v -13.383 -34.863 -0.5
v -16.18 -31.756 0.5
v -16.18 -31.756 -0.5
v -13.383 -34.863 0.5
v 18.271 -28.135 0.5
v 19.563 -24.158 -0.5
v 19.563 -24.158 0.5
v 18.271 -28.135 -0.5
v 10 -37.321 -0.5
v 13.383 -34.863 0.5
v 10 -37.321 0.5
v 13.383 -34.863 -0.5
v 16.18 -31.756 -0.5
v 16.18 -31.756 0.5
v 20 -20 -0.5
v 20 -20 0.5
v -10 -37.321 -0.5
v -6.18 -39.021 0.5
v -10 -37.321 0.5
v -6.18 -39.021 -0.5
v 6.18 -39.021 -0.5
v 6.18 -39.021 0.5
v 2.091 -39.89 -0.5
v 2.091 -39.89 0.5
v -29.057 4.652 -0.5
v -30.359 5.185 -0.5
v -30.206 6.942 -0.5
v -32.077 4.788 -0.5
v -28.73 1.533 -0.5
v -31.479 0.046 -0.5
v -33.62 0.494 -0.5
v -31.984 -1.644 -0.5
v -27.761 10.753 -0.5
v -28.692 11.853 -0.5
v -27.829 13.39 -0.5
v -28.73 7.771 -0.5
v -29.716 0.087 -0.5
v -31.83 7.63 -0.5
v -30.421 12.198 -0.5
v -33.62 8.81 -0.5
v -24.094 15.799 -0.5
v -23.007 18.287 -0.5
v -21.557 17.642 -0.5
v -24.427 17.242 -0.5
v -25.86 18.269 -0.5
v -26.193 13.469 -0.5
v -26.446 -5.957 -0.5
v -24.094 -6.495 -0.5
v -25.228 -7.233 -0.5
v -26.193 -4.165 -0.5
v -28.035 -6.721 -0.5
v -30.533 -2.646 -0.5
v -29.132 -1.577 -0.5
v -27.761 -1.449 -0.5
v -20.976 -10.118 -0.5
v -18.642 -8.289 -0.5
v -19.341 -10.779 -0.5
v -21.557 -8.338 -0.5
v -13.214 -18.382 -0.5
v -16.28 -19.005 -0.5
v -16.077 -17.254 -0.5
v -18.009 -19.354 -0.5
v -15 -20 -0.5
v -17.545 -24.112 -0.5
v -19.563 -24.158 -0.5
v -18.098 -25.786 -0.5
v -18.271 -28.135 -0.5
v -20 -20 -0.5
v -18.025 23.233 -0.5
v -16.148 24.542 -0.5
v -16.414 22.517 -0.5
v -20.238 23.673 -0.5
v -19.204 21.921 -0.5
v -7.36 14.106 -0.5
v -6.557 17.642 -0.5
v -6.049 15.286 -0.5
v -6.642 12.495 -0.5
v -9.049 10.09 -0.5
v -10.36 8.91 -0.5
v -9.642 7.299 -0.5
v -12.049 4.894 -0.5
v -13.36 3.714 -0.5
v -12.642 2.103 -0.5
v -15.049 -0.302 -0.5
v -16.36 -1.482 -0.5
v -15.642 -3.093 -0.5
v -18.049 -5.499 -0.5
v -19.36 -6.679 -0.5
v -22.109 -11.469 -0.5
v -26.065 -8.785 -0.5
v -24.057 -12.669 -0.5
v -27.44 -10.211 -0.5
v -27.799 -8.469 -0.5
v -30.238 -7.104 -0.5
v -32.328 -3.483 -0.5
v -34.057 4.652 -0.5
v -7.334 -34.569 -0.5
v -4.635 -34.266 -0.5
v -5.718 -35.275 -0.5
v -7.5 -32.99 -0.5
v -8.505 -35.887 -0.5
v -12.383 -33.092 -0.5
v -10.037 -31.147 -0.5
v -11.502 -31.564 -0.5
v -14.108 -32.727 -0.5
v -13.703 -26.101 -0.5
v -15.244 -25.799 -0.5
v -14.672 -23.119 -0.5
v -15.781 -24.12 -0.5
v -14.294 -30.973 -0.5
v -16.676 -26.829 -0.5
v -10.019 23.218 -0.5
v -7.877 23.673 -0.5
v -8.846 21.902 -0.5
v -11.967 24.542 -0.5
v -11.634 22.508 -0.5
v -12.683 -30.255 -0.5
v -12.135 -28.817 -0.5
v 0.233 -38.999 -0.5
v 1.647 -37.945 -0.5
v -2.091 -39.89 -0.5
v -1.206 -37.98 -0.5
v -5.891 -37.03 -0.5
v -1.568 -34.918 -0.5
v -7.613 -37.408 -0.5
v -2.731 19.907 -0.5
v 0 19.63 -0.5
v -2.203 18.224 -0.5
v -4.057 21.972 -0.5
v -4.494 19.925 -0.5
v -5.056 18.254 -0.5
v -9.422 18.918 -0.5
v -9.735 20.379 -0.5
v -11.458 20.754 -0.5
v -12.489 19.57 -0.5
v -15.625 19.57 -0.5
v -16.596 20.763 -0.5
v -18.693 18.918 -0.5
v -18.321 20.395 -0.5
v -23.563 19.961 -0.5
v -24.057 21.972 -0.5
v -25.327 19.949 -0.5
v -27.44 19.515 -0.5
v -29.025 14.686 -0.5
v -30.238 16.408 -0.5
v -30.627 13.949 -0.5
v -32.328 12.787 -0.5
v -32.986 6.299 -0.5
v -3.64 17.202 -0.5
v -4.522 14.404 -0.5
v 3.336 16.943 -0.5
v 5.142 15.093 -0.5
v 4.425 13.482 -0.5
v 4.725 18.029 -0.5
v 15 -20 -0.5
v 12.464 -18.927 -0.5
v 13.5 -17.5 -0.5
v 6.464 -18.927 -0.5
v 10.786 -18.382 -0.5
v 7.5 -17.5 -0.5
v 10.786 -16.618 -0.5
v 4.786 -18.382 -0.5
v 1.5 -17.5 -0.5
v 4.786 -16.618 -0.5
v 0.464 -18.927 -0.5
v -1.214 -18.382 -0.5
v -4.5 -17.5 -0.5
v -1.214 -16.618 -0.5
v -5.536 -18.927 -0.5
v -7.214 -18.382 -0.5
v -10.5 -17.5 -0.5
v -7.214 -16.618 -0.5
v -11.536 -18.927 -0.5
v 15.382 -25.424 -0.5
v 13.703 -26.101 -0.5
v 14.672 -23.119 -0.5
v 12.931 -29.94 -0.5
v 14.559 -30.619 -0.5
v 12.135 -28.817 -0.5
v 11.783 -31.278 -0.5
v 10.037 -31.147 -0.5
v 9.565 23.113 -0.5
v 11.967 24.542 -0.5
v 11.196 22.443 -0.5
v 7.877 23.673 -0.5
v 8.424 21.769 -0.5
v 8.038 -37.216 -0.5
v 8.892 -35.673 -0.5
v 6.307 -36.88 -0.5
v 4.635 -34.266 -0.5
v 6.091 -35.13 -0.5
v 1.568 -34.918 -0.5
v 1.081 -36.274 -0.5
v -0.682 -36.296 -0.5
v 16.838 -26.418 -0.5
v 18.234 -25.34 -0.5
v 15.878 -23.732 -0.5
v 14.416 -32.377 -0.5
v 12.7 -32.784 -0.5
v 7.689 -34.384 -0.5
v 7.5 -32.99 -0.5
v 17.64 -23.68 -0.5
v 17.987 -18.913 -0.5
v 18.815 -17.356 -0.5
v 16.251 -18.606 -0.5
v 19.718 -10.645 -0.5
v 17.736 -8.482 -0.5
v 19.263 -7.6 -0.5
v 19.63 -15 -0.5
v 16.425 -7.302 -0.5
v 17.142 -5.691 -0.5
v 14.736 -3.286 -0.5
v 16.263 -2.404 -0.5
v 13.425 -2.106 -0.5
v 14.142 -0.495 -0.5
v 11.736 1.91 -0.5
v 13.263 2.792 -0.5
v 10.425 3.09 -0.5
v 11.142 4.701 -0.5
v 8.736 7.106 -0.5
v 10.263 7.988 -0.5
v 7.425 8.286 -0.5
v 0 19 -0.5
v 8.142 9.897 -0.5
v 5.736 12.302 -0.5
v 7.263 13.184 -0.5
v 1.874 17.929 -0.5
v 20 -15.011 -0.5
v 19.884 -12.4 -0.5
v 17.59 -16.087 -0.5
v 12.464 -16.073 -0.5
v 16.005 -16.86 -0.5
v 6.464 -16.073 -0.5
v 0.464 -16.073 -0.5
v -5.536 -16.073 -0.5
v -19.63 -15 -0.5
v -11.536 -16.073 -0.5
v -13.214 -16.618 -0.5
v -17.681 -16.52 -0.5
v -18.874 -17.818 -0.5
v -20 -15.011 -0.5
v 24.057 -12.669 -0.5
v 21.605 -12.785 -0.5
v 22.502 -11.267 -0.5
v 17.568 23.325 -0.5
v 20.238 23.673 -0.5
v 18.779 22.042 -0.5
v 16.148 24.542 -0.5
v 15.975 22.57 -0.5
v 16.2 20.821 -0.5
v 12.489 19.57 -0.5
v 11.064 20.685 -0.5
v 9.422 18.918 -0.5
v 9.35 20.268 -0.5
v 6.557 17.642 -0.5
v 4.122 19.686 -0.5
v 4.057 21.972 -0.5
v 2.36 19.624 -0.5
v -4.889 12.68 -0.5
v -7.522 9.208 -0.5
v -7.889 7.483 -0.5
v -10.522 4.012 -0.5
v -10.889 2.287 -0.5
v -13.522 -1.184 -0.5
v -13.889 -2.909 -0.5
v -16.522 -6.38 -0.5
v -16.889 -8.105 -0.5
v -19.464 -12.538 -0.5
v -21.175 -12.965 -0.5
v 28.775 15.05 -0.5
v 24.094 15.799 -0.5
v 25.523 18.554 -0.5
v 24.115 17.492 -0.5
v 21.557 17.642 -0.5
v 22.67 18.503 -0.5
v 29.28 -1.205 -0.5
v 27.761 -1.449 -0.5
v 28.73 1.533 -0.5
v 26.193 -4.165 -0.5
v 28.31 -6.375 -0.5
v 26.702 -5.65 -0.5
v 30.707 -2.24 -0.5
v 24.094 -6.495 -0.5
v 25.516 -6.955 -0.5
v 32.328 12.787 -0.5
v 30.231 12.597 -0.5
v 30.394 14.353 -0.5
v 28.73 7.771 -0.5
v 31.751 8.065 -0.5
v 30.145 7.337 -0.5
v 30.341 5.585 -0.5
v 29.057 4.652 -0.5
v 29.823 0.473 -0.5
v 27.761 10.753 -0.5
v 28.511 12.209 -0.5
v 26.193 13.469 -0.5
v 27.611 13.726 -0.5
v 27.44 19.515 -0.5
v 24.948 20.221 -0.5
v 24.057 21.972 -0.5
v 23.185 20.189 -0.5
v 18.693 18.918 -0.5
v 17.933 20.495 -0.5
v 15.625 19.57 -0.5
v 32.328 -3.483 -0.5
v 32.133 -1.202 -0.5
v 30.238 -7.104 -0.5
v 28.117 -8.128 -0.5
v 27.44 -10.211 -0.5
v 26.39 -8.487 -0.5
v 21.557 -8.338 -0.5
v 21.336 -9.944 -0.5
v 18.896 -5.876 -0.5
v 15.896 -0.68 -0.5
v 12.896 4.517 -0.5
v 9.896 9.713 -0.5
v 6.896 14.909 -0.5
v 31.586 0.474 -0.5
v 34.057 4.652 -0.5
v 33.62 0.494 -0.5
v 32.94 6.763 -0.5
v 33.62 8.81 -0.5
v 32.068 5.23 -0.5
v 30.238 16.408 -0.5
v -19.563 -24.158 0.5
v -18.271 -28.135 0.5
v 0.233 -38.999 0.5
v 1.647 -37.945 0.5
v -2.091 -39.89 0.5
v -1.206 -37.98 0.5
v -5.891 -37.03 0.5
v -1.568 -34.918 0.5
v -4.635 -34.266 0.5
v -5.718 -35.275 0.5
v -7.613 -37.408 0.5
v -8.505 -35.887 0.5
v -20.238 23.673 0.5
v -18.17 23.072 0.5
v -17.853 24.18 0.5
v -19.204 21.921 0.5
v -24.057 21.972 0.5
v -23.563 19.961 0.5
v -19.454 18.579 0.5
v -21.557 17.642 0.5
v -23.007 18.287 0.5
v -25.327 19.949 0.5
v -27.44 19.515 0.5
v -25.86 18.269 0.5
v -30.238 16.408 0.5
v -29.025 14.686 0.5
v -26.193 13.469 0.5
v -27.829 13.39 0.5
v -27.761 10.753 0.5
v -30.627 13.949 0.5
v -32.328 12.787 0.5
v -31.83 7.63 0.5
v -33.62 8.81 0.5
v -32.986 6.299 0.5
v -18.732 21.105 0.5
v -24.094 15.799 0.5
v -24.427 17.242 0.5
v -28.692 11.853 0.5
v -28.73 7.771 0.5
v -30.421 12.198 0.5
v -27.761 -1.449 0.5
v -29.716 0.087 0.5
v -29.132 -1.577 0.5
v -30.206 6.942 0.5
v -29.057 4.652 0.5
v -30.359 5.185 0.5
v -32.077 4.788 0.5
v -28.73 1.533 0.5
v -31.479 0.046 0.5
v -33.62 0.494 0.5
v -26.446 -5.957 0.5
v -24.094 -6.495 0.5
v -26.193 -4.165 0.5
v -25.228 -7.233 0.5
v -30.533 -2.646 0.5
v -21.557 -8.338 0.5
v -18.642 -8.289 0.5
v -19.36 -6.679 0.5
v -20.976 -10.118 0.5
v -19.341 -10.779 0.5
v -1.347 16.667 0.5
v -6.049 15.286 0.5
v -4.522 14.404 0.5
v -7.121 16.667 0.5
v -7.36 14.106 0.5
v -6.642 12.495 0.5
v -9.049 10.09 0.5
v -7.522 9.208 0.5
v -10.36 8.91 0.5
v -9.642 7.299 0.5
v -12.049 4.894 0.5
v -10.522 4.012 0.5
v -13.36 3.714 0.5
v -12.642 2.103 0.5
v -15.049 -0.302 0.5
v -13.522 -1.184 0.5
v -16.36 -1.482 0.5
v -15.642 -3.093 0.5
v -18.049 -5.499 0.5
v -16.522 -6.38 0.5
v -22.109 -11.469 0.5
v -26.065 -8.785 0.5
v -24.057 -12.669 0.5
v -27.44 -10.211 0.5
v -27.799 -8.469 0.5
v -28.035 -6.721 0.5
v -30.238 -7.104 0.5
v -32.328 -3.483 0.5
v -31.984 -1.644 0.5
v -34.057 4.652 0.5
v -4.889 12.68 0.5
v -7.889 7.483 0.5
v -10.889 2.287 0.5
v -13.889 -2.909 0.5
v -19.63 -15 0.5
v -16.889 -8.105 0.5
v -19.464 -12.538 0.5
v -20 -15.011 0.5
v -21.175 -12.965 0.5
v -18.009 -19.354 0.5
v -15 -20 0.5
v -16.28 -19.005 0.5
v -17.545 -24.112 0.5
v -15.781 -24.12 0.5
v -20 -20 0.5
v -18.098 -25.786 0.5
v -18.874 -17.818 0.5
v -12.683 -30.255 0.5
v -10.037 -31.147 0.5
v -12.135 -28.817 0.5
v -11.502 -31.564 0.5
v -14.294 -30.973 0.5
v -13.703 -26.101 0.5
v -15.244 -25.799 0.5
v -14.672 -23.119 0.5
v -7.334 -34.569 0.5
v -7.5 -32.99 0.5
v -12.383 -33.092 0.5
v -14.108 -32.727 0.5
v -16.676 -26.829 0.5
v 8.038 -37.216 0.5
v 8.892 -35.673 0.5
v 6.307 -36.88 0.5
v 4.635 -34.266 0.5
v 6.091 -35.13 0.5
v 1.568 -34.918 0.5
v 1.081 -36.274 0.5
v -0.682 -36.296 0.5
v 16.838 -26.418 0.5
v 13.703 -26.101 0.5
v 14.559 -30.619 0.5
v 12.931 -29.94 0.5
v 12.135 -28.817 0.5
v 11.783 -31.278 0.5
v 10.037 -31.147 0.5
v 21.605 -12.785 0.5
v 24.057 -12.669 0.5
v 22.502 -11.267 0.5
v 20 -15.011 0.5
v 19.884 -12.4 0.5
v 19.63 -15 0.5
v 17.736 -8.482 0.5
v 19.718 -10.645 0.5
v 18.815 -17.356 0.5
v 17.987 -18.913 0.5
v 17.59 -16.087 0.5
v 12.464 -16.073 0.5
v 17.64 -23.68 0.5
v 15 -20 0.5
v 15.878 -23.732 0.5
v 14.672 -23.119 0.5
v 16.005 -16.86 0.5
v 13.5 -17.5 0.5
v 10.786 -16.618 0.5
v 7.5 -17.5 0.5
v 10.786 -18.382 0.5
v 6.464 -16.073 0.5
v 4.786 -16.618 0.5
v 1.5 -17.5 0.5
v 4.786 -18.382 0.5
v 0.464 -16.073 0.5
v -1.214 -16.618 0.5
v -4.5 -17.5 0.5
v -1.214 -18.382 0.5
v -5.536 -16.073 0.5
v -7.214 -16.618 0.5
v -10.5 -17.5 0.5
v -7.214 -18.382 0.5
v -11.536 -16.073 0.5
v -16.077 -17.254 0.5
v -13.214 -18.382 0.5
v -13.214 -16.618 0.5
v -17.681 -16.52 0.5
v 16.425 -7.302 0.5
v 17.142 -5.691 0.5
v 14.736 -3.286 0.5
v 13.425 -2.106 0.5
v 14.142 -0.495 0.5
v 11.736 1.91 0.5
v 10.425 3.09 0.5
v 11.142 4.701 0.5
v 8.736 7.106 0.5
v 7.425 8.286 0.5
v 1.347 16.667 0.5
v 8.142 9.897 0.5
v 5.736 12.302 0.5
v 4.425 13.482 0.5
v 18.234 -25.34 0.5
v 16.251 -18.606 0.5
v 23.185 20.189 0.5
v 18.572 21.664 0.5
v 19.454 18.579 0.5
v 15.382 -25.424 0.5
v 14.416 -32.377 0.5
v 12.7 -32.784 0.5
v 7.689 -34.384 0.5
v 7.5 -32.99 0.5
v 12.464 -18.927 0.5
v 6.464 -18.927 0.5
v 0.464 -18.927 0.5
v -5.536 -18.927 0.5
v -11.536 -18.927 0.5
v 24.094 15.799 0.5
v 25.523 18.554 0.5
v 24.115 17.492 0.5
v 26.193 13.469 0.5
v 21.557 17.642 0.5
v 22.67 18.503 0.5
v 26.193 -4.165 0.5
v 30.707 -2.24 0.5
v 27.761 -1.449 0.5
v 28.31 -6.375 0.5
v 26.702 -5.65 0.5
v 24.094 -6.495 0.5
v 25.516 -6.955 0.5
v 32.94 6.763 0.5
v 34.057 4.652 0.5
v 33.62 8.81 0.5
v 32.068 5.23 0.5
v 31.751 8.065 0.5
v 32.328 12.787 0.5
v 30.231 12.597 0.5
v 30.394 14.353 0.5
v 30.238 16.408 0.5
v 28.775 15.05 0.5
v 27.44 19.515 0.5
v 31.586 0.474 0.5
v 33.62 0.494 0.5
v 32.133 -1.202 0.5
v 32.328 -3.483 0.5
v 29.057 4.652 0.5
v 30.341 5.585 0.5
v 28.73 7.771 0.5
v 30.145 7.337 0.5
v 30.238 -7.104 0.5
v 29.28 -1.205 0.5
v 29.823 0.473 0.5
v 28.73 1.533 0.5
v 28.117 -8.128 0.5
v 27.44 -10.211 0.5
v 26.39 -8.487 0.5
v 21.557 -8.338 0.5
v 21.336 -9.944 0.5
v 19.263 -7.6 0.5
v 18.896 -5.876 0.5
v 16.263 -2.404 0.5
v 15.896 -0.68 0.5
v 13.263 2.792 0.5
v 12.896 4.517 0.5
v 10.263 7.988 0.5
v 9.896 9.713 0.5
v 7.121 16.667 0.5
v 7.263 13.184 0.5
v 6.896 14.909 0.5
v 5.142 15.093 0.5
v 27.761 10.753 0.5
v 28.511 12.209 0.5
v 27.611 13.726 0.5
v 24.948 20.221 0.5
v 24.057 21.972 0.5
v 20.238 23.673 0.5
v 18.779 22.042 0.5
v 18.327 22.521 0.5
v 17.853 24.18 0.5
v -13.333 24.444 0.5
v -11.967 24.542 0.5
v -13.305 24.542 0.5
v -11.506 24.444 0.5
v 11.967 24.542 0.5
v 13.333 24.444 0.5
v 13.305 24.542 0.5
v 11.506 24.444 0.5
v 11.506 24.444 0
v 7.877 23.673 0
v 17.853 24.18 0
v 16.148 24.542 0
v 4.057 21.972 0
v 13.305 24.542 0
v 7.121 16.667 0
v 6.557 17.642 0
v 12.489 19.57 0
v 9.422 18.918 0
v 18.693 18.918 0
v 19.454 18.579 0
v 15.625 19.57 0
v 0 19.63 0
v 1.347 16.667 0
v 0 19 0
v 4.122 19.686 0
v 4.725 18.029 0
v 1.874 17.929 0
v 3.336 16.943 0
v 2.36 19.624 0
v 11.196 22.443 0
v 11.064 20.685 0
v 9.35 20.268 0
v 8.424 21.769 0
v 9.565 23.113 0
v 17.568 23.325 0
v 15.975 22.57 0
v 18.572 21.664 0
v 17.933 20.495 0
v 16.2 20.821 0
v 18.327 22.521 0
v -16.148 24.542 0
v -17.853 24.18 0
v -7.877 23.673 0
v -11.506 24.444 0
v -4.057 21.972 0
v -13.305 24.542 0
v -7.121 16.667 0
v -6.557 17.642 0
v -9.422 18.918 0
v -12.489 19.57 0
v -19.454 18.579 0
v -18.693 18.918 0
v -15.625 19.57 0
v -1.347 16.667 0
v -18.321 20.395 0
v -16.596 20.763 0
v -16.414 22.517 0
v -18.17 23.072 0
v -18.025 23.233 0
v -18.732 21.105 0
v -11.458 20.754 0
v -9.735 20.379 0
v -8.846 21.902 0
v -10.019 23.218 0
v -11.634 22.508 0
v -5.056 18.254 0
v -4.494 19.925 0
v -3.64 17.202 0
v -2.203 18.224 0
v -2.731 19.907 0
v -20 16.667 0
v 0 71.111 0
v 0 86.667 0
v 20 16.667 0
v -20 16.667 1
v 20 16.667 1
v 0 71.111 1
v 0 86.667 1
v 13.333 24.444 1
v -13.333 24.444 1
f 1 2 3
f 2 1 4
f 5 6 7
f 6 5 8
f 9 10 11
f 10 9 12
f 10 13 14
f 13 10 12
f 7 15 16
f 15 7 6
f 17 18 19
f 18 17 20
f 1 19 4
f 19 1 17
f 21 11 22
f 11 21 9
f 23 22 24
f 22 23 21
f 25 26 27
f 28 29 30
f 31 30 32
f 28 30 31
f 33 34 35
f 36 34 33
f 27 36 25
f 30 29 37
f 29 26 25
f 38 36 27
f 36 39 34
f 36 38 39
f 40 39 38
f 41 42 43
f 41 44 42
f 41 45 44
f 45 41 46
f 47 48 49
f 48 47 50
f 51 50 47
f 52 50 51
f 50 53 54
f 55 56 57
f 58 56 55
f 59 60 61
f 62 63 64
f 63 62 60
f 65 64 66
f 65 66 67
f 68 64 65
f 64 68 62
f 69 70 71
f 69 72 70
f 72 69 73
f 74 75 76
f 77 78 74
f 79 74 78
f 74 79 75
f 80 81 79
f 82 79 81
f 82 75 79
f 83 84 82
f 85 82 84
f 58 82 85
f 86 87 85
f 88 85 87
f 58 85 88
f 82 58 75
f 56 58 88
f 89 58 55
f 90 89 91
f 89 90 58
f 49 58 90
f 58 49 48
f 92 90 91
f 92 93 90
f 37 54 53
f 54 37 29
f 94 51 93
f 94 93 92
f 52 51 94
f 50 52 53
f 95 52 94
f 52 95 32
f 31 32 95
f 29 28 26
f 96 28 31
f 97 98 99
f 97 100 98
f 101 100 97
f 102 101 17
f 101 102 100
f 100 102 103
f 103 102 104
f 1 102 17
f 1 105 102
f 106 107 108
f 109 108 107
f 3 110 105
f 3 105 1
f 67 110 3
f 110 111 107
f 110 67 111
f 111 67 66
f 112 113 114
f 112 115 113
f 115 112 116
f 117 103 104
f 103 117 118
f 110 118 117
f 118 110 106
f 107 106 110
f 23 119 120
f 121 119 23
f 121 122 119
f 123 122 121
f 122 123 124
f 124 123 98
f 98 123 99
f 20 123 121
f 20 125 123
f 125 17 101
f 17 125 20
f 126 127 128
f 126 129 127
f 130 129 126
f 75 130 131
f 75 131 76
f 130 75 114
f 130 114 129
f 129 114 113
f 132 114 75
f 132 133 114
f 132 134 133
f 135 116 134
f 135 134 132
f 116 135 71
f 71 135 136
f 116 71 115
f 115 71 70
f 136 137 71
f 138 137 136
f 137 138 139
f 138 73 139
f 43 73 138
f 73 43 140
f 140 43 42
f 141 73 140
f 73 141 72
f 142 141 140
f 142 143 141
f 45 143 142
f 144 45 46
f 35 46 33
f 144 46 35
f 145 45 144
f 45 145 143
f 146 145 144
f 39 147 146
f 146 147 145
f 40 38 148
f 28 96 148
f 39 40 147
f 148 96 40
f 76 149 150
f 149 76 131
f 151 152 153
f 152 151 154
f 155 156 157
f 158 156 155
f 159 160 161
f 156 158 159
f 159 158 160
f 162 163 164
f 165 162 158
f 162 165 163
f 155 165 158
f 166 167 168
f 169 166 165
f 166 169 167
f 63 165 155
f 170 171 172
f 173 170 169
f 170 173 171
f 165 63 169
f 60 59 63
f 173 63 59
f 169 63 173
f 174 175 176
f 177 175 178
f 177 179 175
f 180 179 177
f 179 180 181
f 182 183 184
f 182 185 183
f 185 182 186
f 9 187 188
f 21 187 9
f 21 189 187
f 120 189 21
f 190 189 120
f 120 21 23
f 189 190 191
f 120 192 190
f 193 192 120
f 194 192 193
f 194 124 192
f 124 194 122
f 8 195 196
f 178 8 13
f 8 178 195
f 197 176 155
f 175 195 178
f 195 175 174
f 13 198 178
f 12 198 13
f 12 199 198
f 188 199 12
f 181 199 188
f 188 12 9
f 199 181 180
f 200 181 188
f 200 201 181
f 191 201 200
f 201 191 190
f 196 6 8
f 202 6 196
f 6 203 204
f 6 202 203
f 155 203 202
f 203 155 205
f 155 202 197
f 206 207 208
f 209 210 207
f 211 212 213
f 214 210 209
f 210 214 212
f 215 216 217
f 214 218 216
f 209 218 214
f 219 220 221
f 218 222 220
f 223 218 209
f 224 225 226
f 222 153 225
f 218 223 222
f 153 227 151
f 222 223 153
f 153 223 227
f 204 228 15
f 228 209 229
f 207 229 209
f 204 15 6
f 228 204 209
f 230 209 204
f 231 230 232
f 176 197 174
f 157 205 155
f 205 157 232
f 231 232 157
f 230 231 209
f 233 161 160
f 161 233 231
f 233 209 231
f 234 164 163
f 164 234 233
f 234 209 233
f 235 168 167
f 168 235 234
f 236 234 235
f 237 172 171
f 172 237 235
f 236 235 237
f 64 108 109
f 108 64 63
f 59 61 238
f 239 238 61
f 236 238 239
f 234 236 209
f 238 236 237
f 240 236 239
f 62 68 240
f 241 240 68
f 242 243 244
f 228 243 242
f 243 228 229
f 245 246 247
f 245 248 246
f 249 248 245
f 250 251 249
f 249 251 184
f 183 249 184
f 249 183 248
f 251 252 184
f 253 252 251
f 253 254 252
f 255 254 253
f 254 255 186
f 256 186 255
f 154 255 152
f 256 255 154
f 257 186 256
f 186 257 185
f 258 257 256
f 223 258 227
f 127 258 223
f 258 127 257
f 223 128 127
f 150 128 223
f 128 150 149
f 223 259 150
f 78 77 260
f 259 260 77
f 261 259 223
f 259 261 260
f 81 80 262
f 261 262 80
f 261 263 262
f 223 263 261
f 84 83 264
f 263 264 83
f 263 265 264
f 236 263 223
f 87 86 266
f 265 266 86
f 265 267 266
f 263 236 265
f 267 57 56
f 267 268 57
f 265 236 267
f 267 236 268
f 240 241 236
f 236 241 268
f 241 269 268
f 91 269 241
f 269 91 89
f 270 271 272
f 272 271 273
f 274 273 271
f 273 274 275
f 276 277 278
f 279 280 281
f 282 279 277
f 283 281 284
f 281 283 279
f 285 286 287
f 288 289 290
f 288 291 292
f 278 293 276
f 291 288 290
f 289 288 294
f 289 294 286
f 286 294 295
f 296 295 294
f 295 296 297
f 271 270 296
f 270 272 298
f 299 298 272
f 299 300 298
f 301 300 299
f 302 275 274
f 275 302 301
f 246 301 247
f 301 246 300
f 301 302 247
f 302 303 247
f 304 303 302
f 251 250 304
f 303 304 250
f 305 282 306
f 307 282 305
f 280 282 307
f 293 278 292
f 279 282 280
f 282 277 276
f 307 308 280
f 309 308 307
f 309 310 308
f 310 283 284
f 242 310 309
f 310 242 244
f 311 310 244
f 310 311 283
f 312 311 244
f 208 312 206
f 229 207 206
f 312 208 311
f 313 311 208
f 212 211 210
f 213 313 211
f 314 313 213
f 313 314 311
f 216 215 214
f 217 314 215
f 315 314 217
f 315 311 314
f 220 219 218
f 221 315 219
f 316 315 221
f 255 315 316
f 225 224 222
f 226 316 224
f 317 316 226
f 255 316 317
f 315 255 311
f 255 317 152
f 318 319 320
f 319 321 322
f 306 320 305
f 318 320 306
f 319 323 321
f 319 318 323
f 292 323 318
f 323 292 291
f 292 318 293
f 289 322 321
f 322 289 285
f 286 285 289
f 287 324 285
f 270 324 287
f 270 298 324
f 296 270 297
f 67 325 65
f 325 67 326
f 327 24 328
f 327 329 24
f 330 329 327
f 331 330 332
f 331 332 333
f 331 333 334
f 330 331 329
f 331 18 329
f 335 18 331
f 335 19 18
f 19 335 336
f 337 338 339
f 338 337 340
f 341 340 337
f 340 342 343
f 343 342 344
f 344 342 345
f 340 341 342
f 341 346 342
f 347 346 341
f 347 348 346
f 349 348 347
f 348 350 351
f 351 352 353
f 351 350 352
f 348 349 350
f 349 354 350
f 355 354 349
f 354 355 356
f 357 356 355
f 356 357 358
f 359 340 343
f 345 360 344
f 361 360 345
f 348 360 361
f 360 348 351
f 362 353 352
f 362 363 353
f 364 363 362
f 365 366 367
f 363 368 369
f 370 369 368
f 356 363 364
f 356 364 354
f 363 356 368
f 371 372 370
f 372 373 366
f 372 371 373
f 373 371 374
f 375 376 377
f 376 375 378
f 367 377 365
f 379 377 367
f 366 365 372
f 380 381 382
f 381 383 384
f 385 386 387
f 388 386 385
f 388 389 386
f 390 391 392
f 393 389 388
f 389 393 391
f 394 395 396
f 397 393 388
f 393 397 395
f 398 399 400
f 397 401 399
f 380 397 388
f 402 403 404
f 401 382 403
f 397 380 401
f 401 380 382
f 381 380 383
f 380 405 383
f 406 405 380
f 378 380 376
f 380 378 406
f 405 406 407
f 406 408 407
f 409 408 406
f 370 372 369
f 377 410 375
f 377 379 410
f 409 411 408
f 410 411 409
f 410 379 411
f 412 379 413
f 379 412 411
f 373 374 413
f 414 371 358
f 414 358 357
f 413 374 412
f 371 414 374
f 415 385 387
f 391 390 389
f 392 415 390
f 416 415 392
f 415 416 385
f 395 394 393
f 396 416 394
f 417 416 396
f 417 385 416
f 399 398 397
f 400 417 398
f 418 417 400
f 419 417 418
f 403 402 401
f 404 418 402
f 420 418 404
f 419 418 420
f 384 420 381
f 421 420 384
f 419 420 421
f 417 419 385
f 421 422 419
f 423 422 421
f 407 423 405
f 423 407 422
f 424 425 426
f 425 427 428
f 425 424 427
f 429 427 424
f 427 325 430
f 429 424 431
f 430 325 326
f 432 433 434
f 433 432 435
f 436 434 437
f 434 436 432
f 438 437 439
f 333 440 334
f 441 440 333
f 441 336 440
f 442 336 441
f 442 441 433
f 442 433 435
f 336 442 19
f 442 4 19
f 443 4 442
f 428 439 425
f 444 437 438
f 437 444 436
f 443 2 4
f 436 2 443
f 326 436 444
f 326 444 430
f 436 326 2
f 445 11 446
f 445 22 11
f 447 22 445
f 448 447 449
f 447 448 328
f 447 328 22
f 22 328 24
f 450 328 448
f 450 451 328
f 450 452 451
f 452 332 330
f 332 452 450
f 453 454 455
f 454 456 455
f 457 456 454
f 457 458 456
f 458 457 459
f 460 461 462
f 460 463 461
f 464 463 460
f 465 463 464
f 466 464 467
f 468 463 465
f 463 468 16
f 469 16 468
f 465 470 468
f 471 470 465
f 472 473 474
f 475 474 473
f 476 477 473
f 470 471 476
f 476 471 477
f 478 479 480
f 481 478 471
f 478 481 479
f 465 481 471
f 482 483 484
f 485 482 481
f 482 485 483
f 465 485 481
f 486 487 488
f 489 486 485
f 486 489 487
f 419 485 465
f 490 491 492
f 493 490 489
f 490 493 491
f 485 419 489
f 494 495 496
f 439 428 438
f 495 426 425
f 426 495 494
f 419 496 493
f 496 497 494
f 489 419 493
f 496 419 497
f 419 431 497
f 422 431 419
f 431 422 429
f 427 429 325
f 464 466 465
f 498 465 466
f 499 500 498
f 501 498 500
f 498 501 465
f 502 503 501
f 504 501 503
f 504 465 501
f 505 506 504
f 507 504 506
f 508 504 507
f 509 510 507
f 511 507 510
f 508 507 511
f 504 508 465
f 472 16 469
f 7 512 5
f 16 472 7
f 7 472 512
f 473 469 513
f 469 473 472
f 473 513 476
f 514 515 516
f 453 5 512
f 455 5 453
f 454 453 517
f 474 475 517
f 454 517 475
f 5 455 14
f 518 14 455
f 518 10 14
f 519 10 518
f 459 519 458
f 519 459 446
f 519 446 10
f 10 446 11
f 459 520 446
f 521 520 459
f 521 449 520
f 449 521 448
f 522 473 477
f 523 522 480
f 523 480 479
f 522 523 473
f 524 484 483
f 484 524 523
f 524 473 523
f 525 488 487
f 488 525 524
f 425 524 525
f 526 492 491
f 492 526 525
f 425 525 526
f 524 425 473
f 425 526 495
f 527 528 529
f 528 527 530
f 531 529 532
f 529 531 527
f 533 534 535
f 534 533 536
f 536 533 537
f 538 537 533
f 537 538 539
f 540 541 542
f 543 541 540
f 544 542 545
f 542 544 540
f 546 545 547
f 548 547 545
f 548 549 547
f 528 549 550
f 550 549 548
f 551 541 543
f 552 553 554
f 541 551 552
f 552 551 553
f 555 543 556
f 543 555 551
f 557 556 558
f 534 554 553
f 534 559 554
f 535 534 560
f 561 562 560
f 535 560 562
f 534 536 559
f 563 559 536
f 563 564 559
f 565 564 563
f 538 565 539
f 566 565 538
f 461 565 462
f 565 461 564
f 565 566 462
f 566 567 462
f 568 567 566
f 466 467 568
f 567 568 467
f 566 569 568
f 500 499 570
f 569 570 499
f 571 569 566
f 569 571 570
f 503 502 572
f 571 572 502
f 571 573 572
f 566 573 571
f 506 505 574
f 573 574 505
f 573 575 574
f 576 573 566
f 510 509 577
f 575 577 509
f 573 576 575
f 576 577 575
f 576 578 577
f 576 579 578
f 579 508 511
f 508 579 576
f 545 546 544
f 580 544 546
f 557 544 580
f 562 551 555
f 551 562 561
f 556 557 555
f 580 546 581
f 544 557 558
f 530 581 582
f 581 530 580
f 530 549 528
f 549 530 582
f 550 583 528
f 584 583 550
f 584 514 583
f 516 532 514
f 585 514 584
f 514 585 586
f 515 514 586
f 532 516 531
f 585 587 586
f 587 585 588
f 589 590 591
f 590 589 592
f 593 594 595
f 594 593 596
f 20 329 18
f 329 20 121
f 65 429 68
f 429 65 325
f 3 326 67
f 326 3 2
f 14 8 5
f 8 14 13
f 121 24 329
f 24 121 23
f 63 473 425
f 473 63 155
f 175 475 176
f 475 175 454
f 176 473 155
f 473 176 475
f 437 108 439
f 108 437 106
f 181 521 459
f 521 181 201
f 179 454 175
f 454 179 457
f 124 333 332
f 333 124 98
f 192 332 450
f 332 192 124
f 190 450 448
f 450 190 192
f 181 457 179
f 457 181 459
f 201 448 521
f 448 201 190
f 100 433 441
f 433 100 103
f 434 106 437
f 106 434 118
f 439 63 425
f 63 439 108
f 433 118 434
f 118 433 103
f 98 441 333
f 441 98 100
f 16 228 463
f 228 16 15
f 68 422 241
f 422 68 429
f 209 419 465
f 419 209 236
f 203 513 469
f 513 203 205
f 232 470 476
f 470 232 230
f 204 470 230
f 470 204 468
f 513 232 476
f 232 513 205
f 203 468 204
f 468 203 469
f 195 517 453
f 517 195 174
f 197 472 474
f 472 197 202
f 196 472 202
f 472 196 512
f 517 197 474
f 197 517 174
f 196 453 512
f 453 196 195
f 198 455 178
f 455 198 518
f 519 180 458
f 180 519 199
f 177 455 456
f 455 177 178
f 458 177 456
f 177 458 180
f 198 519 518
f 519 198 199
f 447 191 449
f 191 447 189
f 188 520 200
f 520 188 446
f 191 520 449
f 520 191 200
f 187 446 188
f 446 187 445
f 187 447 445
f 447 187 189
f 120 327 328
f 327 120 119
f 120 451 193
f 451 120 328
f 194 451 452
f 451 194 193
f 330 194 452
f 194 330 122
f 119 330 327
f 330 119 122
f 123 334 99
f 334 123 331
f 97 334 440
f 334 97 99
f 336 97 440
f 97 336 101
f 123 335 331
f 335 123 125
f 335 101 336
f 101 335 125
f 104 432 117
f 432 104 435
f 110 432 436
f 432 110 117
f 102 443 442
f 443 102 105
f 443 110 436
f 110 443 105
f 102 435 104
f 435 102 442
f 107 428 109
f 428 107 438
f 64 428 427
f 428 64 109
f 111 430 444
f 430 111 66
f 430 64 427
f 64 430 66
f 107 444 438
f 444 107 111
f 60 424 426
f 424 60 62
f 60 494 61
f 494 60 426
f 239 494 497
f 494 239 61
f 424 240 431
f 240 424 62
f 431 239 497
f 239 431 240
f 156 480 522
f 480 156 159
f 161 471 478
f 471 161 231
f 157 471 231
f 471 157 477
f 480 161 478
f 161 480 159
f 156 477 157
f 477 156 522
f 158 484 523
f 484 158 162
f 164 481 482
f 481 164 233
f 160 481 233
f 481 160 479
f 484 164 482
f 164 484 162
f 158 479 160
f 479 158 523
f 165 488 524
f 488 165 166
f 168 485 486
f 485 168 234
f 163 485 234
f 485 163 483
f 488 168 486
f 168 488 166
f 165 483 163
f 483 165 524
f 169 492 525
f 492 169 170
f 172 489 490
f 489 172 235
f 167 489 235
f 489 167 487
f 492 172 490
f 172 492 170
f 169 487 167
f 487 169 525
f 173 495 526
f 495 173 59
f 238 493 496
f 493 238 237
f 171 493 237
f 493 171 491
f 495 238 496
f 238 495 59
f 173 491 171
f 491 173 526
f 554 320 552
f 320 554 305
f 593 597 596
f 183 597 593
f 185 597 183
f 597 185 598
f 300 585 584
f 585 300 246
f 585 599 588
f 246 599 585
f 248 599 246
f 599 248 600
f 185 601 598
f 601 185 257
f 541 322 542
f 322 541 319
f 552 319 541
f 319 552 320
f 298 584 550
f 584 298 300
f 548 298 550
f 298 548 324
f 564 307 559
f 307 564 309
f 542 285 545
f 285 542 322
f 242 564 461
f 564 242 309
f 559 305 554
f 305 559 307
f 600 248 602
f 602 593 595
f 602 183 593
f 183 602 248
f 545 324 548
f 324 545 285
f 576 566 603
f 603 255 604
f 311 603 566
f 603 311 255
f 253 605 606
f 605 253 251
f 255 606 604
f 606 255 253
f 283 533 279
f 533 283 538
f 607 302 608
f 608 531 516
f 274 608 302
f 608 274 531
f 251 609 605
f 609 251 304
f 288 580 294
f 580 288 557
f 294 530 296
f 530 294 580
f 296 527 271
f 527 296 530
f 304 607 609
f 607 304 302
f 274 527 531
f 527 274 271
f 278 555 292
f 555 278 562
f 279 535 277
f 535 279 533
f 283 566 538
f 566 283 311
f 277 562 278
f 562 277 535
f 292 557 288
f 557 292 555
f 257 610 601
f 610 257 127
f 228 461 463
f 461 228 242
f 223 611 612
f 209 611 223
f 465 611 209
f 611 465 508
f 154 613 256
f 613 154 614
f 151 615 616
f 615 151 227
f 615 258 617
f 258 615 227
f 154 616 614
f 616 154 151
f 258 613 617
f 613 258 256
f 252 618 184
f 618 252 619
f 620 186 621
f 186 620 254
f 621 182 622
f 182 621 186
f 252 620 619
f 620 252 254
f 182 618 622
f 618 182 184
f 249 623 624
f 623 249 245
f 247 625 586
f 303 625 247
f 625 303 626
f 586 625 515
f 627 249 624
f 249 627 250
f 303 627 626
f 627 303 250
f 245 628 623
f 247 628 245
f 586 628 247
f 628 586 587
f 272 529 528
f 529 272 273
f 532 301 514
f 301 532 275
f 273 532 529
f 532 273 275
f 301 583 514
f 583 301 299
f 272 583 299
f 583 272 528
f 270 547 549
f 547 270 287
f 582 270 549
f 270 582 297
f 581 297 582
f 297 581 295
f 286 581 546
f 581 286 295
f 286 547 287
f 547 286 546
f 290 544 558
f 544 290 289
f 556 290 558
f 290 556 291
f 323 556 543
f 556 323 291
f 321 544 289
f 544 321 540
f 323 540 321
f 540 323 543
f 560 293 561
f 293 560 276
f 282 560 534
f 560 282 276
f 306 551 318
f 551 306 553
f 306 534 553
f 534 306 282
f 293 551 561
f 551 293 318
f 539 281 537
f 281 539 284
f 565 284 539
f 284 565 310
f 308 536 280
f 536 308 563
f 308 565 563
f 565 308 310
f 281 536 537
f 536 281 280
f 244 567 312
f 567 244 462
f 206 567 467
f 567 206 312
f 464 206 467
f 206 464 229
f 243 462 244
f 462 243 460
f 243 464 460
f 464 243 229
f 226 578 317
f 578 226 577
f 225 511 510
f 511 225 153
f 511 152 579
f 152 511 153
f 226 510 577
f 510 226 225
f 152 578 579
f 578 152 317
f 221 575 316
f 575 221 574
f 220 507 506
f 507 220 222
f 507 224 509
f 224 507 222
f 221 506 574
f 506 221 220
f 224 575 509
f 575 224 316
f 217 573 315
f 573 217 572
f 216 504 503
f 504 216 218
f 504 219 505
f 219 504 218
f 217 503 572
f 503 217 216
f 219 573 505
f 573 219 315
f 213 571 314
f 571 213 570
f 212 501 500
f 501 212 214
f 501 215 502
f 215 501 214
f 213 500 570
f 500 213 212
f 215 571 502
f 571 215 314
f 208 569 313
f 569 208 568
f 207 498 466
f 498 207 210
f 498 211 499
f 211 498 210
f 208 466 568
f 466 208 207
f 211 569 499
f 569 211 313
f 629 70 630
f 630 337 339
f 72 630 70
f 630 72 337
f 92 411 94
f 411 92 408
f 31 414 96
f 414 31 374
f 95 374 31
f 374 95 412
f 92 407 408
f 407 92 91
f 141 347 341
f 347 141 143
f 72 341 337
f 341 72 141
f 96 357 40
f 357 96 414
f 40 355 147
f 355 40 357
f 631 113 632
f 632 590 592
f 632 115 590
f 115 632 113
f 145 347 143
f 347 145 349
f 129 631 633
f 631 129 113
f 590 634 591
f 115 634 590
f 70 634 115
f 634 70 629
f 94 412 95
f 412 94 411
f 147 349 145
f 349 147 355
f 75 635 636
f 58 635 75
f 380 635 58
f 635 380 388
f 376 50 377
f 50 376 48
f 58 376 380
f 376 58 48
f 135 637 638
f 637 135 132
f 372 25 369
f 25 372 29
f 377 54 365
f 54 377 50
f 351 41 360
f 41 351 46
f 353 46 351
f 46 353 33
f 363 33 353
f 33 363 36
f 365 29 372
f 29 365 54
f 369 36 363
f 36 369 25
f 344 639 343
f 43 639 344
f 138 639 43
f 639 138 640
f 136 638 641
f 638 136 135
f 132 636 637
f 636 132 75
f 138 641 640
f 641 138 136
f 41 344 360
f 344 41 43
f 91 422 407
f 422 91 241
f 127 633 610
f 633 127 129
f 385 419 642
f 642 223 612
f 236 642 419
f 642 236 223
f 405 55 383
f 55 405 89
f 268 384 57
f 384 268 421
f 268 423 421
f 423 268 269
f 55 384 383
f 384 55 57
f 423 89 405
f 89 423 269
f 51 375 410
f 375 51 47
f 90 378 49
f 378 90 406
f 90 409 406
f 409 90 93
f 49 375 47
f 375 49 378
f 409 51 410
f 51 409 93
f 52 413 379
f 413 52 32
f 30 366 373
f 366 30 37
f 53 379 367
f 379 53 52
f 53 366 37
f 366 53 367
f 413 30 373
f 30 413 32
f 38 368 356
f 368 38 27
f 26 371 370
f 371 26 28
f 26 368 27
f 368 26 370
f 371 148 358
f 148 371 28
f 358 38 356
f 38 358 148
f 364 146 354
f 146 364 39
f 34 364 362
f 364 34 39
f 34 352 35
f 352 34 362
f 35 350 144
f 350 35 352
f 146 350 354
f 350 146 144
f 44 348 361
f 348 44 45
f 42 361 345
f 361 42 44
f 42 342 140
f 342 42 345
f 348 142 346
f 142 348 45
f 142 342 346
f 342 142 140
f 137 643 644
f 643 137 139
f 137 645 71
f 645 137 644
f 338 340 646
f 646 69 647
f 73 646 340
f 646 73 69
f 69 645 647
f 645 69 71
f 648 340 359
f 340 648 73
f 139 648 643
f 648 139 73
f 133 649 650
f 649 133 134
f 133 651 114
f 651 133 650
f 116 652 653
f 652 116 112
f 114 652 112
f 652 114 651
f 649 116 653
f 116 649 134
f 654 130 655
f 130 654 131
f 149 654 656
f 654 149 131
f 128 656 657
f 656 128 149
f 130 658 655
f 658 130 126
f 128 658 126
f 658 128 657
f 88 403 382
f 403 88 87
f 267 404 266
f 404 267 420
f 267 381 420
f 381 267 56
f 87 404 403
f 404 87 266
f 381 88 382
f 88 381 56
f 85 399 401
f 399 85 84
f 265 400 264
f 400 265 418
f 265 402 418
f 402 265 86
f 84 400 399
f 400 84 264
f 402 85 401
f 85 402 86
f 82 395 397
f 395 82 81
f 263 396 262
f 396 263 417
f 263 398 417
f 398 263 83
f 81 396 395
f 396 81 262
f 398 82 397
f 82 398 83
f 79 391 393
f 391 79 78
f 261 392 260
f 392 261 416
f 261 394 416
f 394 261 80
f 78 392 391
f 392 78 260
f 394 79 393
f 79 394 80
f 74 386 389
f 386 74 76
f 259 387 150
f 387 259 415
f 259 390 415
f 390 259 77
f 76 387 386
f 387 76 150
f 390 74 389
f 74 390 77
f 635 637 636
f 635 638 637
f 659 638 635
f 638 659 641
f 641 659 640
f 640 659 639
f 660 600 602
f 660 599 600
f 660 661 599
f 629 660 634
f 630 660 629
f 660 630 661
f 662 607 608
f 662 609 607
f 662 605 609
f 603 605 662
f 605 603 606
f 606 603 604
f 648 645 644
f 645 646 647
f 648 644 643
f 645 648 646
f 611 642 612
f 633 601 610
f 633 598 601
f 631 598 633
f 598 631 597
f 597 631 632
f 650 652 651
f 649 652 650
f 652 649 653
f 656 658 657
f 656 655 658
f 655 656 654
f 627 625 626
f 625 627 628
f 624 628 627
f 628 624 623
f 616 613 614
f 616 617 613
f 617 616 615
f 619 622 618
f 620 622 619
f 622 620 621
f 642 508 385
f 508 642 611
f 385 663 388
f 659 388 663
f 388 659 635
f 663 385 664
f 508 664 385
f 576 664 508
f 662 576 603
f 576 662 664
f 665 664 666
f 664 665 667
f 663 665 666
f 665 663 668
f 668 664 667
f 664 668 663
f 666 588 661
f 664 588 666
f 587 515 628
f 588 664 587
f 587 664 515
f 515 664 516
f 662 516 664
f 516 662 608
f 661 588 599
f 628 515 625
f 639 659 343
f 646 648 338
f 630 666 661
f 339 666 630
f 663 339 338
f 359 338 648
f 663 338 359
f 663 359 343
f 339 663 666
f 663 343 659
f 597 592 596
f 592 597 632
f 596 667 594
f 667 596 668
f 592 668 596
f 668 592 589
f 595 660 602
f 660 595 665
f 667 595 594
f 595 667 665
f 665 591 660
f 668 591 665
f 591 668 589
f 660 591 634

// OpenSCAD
module half_cylinder(radius=0,height=0) { 
    difference(){
        translate([0,0,-height/2])
        cylinder( r = radius , h = height ); 
        translate([-radius,0,-(height+2)/2]) 
        cube( [ radius*2 , radius*2 , height+2] ); 
   }
}

module d_part(ra=0,he=0) { 
 difference() { 
 union(){
 difference(){
    union(){
        difference() { 
            half_cylinder(radius=ra,height=he); 
            half_cylinder(radius=ra-5,height=he+1); 
        }
        translate([-ra,0,-he/2])
        cube( [ ra*2 , 5 , he ] ); 
    } 
    for ( r = [-8:180/7.4:195]){
            rotate([0,0,-r]){    
                translate( [ ra-2.5 , 0 , -5]) 
                cylinder( r = 1.5 , h = 10) ;
            } 
        }
    }}
    for ( x = [-12:6:6*2]) { 
        translate([-x,2.5,-2.5])
        cylinder( r = 1.5 , h = 10); 
    }}
}

module triangle(){
    base = 40/2; 
    apex = 70; 
    scale = 1.5;
    ox = (-base + base + 0    )/3; 
    oy = ( 0    + 0    + apex )/3; 
    color([0,0,1])
    difference(){
        translate([-ox,-oy,0])
            linear_extrude( height = 1 )
                polygon( points=[
                     [-base,0],
                     [base,0],[0,apex]], faces=[[0,1,2]] ); 
    
    
   translate([-ox/scale,-oy/scale,0])
    linear_extrude( height = 2 )
        polygon( points=[
                     [-base/scale,0],
                     [base/scale,0],[0,apex/scale]], faces=[[0,1,2]] ); 
    
    }
}

translate([0,-20,0])
d_part(ra=20,he=1); 

rotate([0,0,120]) {
    translate([-3,-14.5,0])
    d_part(ra=20,he=1); 
}    

rotate([0,0,-120]) {
    translate([3,-14.5,0])
    d_part(ra=20,he=1); 
} 

translate([0,40,0])
triangle(); 
